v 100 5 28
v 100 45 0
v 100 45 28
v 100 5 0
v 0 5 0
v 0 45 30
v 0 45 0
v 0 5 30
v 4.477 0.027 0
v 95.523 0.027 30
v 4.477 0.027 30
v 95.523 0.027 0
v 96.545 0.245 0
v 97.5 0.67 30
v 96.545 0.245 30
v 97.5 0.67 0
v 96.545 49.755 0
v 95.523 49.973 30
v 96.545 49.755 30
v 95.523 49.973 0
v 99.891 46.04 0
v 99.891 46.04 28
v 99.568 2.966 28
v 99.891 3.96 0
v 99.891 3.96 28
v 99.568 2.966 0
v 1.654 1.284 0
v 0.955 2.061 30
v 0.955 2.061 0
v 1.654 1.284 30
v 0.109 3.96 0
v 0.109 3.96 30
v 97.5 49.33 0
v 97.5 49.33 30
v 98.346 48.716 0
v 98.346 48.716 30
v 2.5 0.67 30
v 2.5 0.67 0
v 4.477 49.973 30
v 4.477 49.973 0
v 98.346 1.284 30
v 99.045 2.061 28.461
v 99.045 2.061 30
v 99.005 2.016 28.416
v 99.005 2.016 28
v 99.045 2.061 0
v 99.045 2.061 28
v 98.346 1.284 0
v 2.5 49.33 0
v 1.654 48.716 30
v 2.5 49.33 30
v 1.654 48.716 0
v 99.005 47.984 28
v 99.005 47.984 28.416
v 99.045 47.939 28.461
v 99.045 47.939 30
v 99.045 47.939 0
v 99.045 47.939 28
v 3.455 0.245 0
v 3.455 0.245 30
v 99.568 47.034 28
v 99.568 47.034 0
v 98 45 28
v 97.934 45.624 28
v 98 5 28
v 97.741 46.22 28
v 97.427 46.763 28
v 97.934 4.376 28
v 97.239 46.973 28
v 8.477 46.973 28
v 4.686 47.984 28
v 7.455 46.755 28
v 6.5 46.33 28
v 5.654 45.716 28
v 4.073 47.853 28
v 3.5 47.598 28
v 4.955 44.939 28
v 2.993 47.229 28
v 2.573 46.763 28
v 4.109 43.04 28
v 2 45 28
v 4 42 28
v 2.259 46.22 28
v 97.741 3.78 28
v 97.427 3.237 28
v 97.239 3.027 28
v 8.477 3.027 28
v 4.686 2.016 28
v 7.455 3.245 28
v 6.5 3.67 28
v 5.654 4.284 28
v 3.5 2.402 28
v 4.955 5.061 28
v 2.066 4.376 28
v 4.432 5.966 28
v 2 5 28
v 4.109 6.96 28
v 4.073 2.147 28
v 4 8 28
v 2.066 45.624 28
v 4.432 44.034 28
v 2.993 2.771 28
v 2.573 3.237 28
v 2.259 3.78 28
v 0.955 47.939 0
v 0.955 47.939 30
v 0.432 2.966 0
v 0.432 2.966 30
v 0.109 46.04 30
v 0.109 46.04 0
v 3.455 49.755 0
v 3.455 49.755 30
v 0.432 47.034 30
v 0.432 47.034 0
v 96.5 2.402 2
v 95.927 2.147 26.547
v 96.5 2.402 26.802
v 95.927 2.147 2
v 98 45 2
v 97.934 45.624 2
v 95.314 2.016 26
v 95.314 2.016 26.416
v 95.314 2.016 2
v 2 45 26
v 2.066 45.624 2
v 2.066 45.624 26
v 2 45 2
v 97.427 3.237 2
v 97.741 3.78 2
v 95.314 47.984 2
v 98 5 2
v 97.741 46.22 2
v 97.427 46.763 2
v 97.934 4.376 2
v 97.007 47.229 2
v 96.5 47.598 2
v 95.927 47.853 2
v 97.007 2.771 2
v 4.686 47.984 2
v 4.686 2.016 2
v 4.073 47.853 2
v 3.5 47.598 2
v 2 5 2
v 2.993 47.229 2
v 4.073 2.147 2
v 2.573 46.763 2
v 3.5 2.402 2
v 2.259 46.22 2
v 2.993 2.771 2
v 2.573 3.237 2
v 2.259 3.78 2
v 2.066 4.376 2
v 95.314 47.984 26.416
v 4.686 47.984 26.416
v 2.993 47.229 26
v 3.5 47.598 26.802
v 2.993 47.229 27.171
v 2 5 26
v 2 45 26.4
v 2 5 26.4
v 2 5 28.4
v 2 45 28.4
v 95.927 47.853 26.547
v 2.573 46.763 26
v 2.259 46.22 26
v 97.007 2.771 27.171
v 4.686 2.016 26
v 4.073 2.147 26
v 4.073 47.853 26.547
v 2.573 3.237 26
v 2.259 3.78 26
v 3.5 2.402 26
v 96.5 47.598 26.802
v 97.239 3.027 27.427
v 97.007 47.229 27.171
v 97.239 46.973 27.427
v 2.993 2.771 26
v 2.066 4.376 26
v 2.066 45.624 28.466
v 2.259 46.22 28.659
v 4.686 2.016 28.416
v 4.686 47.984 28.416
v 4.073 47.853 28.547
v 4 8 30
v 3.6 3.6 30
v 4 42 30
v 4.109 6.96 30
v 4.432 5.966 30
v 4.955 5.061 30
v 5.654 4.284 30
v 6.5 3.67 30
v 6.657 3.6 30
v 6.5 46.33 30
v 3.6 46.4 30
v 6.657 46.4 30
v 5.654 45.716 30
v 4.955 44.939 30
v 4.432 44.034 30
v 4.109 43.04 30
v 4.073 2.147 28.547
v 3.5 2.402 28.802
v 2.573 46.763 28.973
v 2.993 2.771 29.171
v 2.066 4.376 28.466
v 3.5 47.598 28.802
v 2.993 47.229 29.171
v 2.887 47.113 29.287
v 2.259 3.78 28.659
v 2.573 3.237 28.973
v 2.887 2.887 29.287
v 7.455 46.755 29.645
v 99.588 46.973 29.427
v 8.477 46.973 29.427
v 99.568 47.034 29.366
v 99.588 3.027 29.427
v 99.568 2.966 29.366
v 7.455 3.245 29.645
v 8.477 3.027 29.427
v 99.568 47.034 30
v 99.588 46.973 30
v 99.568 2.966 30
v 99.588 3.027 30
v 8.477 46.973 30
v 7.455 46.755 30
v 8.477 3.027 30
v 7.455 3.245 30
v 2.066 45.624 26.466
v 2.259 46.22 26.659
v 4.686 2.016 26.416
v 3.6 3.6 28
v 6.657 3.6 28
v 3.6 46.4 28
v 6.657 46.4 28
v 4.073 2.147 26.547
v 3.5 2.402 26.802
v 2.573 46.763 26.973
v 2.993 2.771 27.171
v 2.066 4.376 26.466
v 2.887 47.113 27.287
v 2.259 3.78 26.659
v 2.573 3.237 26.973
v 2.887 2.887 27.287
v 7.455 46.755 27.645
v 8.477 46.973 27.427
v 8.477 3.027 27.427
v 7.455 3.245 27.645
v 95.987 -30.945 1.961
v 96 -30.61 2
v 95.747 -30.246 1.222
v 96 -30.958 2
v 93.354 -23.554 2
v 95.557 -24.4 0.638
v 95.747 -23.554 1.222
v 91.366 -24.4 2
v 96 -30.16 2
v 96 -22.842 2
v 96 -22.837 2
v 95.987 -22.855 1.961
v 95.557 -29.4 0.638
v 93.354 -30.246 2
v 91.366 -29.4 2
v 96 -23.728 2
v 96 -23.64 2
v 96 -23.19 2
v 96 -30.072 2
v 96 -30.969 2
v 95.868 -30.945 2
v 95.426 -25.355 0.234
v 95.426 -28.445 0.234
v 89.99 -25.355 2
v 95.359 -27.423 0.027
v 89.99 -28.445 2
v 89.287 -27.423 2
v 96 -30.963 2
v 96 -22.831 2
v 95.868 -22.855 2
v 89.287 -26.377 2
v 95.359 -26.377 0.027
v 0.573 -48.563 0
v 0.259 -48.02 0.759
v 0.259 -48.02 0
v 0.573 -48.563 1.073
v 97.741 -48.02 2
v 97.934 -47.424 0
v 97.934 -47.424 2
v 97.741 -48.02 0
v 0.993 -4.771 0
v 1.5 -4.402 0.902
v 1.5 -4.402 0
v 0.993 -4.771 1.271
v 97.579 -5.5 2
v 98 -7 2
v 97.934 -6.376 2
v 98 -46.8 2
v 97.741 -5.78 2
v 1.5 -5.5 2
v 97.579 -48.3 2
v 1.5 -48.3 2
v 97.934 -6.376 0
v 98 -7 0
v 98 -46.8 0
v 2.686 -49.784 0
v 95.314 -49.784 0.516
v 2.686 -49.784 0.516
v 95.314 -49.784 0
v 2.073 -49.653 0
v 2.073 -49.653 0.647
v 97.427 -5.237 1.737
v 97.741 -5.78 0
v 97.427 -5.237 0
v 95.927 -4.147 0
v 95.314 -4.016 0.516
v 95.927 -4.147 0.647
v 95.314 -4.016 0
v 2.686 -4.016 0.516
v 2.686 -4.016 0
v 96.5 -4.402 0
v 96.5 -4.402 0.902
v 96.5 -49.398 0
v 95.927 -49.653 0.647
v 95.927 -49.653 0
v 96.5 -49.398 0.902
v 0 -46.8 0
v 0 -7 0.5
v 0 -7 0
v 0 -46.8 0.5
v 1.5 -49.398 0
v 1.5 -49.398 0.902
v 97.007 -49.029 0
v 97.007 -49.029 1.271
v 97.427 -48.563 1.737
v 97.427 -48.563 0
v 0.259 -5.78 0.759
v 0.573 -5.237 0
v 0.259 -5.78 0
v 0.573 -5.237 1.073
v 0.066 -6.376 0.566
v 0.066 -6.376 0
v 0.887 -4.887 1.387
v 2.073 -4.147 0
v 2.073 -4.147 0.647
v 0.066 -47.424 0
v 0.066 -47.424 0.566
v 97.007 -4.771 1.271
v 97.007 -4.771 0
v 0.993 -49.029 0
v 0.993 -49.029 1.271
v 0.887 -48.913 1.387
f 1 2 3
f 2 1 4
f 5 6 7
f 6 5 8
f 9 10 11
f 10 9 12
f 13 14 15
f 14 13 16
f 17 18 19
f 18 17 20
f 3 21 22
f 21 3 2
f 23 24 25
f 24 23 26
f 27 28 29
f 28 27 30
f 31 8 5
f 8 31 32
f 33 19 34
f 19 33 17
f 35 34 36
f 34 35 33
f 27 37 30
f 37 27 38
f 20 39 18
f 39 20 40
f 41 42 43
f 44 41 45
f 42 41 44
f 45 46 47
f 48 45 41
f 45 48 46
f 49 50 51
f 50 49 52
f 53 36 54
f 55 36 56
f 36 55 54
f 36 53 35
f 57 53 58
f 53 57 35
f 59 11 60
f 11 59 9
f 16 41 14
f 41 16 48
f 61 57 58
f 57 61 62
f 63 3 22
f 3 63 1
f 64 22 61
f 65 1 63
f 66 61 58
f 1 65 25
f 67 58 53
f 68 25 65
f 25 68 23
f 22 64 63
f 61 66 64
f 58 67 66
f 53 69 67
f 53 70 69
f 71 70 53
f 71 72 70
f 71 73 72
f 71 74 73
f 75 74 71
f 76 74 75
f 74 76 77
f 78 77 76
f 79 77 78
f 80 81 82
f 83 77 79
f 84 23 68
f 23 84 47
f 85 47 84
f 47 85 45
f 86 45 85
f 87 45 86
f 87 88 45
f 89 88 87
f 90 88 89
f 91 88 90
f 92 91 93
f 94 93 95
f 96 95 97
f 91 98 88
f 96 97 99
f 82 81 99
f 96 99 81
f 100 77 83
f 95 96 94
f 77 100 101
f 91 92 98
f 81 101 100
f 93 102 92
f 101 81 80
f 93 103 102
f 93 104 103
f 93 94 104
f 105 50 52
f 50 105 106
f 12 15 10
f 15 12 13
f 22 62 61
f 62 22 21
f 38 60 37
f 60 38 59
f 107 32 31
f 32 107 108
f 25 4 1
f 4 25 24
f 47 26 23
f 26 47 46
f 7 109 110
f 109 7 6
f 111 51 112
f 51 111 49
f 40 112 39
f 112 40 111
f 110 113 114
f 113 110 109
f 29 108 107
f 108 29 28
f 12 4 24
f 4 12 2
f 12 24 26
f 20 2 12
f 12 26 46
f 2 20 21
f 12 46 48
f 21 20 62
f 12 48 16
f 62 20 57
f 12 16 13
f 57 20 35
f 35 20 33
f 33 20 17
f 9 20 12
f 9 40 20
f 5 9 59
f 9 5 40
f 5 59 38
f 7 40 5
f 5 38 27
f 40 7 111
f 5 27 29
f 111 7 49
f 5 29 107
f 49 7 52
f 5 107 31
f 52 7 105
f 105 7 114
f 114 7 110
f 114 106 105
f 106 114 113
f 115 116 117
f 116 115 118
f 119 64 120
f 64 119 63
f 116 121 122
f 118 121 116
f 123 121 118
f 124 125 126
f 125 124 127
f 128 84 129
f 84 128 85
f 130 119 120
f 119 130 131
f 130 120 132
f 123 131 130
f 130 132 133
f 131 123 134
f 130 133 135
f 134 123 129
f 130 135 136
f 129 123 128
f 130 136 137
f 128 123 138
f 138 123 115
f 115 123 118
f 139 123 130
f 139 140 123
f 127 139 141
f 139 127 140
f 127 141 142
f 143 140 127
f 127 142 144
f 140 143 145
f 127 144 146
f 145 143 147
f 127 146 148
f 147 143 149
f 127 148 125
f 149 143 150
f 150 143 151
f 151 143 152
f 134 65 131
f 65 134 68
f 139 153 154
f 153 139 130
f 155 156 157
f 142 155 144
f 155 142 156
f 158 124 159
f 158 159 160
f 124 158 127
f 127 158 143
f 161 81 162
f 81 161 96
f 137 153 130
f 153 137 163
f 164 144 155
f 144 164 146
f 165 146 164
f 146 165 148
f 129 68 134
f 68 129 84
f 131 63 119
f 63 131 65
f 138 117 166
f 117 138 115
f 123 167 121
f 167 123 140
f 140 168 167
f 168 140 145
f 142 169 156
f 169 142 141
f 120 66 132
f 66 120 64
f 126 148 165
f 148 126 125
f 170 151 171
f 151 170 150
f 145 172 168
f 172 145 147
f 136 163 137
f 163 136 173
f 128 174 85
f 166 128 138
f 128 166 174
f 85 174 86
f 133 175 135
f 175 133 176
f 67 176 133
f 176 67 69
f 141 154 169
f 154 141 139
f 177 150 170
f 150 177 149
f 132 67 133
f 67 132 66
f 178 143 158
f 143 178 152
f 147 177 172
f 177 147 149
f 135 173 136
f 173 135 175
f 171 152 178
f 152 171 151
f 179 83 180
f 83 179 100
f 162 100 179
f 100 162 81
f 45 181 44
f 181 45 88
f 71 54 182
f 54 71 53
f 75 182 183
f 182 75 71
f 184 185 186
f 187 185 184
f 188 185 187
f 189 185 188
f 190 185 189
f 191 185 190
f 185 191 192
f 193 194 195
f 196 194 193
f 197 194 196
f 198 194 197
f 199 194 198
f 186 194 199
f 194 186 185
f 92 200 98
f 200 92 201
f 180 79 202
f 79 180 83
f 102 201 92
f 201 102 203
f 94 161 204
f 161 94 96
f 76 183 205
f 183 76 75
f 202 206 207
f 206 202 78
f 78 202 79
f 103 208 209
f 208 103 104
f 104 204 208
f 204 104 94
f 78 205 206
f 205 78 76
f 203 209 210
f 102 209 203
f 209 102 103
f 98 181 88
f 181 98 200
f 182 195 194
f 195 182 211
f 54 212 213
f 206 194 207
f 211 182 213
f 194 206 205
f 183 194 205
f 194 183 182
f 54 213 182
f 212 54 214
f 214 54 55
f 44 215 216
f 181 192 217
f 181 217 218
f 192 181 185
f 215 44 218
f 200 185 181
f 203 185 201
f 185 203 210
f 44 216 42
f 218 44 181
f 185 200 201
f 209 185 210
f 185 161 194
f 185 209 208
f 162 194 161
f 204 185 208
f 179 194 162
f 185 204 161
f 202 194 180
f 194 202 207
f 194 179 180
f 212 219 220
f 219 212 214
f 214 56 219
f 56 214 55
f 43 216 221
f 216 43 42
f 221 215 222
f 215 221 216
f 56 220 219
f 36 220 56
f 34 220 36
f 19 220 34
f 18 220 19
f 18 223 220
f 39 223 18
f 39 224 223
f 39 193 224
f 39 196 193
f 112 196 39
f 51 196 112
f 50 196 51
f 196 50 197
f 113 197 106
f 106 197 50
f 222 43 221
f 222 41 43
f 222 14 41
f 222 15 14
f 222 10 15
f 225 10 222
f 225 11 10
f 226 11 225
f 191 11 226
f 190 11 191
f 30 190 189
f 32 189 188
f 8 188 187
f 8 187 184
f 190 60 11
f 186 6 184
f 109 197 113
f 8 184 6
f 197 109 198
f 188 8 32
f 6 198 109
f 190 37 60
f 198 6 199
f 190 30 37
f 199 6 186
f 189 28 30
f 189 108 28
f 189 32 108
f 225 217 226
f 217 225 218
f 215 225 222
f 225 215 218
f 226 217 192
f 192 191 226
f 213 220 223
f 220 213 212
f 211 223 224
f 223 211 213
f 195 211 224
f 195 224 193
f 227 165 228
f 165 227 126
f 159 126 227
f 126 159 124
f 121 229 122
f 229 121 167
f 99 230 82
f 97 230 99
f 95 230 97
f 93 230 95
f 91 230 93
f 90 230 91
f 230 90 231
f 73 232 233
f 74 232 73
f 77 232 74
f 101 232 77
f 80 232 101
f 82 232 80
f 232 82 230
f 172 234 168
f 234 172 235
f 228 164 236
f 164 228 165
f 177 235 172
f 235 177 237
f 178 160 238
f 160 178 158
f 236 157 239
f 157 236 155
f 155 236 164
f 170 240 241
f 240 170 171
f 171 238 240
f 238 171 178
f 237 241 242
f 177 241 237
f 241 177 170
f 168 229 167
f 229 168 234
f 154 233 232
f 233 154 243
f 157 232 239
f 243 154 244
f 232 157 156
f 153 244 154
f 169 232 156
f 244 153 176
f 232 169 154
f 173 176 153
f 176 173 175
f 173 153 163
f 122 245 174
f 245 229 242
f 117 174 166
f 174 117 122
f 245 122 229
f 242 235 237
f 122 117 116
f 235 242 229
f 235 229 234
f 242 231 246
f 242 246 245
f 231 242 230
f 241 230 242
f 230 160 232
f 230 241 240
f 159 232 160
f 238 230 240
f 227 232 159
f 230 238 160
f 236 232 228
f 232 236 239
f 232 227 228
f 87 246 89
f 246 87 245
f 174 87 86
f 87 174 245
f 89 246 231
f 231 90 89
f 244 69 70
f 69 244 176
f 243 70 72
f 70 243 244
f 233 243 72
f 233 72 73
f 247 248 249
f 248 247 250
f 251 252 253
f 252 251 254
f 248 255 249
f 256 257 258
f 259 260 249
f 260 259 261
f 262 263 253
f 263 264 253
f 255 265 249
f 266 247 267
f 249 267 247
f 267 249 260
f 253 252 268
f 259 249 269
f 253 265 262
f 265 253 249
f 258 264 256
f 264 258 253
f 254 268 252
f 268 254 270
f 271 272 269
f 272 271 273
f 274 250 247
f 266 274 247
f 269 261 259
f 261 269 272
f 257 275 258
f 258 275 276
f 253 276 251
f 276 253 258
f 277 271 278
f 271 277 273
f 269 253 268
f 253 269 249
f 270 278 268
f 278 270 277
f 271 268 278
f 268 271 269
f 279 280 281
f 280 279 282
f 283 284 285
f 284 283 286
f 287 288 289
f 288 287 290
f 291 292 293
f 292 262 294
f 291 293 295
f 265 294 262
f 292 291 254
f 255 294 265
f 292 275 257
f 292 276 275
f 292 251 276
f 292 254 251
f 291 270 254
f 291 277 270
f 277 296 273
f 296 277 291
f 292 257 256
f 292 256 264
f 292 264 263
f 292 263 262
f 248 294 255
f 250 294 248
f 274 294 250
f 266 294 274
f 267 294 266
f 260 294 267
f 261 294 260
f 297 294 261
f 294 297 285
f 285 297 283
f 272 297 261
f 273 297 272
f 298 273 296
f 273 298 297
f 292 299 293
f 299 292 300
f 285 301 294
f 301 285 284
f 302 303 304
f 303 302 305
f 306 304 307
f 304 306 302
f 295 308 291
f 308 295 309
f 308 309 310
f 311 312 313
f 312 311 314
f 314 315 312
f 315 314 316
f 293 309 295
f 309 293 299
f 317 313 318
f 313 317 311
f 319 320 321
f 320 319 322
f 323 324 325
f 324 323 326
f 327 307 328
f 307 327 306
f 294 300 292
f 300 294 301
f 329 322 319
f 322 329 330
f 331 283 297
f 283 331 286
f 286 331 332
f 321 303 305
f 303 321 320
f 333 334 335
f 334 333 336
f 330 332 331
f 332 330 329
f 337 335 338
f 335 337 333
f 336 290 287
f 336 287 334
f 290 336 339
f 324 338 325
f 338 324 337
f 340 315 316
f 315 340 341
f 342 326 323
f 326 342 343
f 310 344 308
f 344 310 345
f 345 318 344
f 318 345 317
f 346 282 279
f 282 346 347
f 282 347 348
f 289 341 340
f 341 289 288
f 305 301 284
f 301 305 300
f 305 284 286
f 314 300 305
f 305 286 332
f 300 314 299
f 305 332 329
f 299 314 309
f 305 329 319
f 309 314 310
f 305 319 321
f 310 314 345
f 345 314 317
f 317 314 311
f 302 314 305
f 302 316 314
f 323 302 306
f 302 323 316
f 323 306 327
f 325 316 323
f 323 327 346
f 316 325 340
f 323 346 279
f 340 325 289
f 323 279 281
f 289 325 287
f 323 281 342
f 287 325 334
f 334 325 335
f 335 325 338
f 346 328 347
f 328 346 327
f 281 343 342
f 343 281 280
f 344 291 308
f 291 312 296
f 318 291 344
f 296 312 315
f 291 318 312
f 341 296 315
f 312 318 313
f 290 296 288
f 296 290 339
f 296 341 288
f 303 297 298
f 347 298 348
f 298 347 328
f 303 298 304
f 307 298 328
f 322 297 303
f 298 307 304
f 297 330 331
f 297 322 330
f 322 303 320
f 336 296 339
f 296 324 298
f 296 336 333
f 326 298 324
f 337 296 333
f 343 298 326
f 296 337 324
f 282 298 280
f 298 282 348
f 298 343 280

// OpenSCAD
itemsShown="both"; // [both,box,lid]
boxLength=100;
boxWidth=50;
boxHeight=30;
cornerRadius=5;
wallThickness=2;
bottomThickness=2;
lidThickness=2;
lidClearance=0.2;
lidEdgeThickness=0.5;
// Notch in the lid
withNotch=true;//true;//[true:false]

/* [Global] */
if (itemsShown=="box") showBox();
if (itemsShown=="lid") showLid();
if (itemsShown=="both"){showBox();showLid();}

module showLid(){
	translate ([0, -2*wallThickness, 0]) 
	roundBoxLid(l=boxLength-wallThickness,
				w=boxWidth-2*wallThickness-lidClearance,
				h=lidThickness,
				et=lidEdgeThickness,
				r=cornerRadius-wallThickness,
				notch=withNotch);
}

module showBox(){
	round_box(l=boxLength,
			  w=boxWidth,
			  h=boxHeight,
			  bt=bottomThickness,
			  wt=wallThickness,
			  lt=lidThickness,
			  r=cornerRadius);
}

module round_box(l=40,w=30,h=30,bt=2,wt=2,lt=2,r=5,){
	difference() { 
		round_cube(l=l,w=w,h=h-lt,r=r);
		translate ([wt, wt, bt]) 
		round_cube(l=l-wt*2,w=w-wt*2,h=h,r=r-wt);
	}
	//use two box rims. one to make a slope to support the lid
	roundBoxRim();
	translate ([0, 0, -wt]) roundBoxRim();
}

module roundBoxRim(l=boxLength,
				   w=boxWidth,
				   h=boxHeight,
				   et=lidEdgeThickness,
				   r=cornerRadius,
				   wt=wallThickness,
				   lt=lidThickness){
	difference() { 
		translate ([0, 0, h-lt]) 
		round_cube(l=l,w=w,h=lt,r=r);
		translate ([wt+lt,wt+lt-et*2,h-lt-0.1]) 
		round_cube(l=l*2,w=w-2*(wt+lt)+4*et,h=lt+0.2,r=r-wt+lt);

		//subtract out a lid to make the ledge
		translate ([wt, w-wt, h-lt-0.1])
		roundBoxLid(l=l*2,w=w-2*wt,h=lt+0.1,wt=wt,t=lt,et=0.5,r=r-wt,notch=false);
	}
}

module roundBoxLid(l=40,w=30,h=3,wt=2,t=2,et=0.5,r=5,notch=true){
	translate ([l, 0, 0]) 
	rotate (a = [0, 0, 180]) 
	difference(){
		round_cube(l=l,w=w,h=h,r=r);

		translate ([-1, 0, et]) rotate (a = [45, 0, 0])  cube (size = [l+2, h*2, h*2]); 
		translate ([-1, w, et]) rotate (a = [45, 0, 0])  cube (size = [l+2, h*2, h*2]); 
		translate ([l, -1, et]) rotate (a = [45, 0, 90]) cube (size = [w+2, h*2, h*2]); 
		if (notch==true){
			translate([2,w/2,h+0.001]) thumbNotch(10/2,72,t);
		}
	}
}

module thumbNotch(
	thumbR=12/2,
	angle=72,
	notchHeight=2){

	size=10*thumbR;

	rotate([0,0,90])
	difference(){
		translate([0,
					(thumbR*sin(angle)-notchHeight)/tan(angle),
					 thumbR*sin(angle)-notchHeight])
		rotate([angle,0,0])
		cylinder(r=thumbR,h=size,$fn=30);

		translate([-size,-size,0])
		cube(size*2);
	}
}

module round_cube(l=40,w=30,h=20,r=5,$fn=30){
	hull(){ 
		translate ([r, r, 0]) cylinder (h = h, r=r);
		translate ([r, w-r, 0]) cylinder (h = h, r=r);
		translate ([l-r,w-r, 0]) cylinder (h = h, r=r);
		translate ([l-r, r, 0]) cylinder (h = h, r=r);
	}
}
